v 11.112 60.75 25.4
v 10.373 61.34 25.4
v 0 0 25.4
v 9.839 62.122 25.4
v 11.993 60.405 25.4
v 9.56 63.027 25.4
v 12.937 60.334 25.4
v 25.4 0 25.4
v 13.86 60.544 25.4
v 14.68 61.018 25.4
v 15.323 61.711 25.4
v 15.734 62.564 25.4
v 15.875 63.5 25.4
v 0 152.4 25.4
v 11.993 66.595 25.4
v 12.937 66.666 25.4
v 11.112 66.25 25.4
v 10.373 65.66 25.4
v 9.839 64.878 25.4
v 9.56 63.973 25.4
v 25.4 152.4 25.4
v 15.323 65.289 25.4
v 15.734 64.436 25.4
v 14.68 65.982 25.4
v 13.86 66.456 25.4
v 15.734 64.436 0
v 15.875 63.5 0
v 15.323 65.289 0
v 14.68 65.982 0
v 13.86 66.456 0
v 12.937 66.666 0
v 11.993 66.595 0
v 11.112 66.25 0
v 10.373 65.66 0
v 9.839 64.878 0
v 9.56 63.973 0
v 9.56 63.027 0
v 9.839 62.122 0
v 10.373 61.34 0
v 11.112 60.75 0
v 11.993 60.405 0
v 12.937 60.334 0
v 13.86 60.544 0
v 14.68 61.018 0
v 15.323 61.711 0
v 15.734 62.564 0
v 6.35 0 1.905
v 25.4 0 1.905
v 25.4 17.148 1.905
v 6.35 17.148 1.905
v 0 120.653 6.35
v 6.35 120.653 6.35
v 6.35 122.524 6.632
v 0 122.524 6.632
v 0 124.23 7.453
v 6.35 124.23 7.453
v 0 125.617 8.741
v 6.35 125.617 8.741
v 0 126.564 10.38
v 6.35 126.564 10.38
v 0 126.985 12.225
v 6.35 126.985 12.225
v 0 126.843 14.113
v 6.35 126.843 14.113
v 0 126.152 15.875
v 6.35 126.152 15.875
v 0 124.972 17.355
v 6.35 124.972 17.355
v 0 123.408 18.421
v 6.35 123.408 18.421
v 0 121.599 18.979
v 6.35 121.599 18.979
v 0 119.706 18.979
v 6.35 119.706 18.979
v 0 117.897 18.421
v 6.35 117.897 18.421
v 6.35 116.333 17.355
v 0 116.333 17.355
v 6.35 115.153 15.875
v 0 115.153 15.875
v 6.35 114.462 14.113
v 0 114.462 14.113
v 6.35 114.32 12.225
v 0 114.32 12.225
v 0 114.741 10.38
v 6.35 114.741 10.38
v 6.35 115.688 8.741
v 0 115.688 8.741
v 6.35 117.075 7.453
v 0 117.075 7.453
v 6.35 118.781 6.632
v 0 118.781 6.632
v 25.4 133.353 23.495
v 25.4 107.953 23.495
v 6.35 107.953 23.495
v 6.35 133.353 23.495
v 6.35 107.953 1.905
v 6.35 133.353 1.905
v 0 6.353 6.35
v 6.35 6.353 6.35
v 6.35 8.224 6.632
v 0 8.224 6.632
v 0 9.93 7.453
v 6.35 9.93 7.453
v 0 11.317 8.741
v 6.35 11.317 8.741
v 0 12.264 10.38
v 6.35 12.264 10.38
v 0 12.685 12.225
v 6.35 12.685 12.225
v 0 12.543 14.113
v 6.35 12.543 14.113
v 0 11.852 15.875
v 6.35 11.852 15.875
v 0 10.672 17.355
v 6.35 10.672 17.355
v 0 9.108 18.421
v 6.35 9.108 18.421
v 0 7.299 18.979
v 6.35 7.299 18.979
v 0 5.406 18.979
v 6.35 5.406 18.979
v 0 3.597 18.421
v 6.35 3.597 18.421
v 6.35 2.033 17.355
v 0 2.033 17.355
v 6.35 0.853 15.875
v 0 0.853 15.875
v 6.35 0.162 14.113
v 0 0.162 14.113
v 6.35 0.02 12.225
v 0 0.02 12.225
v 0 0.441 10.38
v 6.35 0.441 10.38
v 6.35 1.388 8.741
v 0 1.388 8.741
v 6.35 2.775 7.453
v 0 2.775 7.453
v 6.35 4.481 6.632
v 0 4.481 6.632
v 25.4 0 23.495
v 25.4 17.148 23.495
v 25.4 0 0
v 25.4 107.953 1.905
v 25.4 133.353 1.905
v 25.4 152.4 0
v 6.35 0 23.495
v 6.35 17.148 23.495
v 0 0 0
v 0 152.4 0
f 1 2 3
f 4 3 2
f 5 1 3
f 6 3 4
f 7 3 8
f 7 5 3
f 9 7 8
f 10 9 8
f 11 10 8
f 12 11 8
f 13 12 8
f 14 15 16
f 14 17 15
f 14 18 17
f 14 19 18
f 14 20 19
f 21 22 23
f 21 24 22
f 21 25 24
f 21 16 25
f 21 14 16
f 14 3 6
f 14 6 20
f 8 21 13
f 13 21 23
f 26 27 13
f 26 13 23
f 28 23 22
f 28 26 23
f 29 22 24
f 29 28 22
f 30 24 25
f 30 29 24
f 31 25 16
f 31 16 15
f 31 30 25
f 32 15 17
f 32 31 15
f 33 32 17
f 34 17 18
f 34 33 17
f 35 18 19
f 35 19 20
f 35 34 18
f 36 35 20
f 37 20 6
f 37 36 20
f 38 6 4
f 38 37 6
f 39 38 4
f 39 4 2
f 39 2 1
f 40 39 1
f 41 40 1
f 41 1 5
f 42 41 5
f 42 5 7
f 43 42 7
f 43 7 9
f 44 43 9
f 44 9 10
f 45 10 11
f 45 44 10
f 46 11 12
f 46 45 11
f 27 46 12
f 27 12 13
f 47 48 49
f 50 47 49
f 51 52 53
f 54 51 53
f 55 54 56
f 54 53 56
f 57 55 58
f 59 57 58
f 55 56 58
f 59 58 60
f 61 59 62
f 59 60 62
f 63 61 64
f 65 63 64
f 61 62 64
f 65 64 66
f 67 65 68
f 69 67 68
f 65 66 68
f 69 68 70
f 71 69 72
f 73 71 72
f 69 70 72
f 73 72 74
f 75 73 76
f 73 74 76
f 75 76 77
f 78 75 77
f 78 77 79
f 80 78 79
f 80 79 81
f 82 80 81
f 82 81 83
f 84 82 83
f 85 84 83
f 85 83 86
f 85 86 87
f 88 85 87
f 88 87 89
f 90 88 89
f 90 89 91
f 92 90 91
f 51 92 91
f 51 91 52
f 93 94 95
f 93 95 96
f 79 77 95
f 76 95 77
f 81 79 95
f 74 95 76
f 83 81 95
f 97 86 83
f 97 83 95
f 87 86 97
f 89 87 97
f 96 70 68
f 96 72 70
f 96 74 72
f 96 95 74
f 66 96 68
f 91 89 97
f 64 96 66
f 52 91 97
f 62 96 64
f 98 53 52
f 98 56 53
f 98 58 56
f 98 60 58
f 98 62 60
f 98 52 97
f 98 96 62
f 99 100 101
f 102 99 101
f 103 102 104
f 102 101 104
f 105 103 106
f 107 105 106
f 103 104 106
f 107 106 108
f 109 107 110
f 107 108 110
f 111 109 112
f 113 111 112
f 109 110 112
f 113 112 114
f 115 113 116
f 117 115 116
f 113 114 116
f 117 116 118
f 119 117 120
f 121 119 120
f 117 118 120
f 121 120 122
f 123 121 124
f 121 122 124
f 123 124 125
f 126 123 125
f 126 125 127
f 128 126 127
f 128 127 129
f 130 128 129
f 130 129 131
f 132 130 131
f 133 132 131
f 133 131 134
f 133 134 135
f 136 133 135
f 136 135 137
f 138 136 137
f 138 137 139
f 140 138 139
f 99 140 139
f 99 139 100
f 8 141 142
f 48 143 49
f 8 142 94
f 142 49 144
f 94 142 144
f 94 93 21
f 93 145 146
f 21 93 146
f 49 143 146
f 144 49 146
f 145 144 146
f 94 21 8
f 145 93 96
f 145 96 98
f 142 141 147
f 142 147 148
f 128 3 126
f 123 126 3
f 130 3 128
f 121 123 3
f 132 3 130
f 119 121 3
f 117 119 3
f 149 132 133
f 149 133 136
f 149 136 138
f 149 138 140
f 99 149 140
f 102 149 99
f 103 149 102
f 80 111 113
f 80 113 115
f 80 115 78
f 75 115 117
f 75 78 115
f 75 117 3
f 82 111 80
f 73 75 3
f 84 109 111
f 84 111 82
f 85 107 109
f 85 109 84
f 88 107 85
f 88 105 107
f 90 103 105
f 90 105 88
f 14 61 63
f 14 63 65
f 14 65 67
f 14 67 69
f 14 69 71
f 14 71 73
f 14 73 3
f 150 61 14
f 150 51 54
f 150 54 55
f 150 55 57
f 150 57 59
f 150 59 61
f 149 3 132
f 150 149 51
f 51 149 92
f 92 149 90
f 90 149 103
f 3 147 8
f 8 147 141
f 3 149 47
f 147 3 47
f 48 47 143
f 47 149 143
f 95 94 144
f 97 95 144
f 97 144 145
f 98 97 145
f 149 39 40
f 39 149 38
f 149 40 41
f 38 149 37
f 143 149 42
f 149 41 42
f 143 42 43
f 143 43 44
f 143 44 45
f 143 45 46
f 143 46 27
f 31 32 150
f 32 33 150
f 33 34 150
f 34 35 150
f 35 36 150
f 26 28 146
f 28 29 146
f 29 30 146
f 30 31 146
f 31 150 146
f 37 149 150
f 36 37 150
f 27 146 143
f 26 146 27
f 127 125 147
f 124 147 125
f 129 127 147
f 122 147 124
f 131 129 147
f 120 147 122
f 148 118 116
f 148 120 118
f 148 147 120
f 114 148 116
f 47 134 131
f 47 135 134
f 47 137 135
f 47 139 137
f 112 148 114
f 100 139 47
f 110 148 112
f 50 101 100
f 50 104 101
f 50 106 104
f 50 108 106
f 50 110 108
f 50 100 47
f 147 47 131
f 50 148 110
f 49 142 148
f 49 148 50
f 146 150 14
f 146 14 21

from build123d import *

# Parameters (mm, degrees)
SKETCH1_W           = 25.4
SKETCH1_H           = 152.4
SKETCH1_R           = 3.175
BOSS_EXTRUDE1_DEPTH = 25.4
SKETCH3_R           = 6.35
CUT_EXTRUDE5_DEPTH  = 26.4
SKETCH5_W           = 21.59
SKETCH5_H           = 21.59
SKETCH5_H_2         = 25.4
CUT_EXTRUDE6_DEPTH  = 19.05


with BuildPart() as part:
    # Sketch1 → Boss-Extrude1 (new body)
    with BuildSketch(Plane.XY):
        with Locations((12.7, 76.2)):
            Rectangle(SKETCH1_W, SKETCH1_H)
        with Locations((12.7, 63.5)):
            Circle(SKETCH1_R, mode=Mode.SUBTRACT)
    extrude(amount=BOSS_EXTRUDE1_DEPTH)

    # Sketch3 → Cut-Extrude5 (cut, through all)
    with BuildSketch(Plane(origin=(25.4, 0, 0), x_dir=(0, 0, -1), z_dir=(1, 0, 0))):
        with Locations((-12.7, 120.65254)):
            Circle(SKETCH3_R)
        with Locations((-12.7, 6.35254)):
            Circle(SKETCH3_R)
    extrude(amount=-CUT_EXTRUDE5_DEPTH, mode=Mode.SUBTRACT)

    # Sketch5 → Cut-Extrude6 (cut)
    with BuildSketch(Plane(origin=(25.4, 0, 0), x_dir=(0, 0, -1), z_dir=(1, 0, 0))):
        with Locations((-12.7, 6.35254)):
            Rectangle(SKETCH5_W, SKETCH5_H)
        with Locations((-12.7, 120.65254)):
            Rectangle(SKETCH5_W, SKETCH5_H_2)
    extrude(amount=-CUT_EXTRUDE6_DEPTH, mode=Mode.SUBTRACT)


solid = part.part
